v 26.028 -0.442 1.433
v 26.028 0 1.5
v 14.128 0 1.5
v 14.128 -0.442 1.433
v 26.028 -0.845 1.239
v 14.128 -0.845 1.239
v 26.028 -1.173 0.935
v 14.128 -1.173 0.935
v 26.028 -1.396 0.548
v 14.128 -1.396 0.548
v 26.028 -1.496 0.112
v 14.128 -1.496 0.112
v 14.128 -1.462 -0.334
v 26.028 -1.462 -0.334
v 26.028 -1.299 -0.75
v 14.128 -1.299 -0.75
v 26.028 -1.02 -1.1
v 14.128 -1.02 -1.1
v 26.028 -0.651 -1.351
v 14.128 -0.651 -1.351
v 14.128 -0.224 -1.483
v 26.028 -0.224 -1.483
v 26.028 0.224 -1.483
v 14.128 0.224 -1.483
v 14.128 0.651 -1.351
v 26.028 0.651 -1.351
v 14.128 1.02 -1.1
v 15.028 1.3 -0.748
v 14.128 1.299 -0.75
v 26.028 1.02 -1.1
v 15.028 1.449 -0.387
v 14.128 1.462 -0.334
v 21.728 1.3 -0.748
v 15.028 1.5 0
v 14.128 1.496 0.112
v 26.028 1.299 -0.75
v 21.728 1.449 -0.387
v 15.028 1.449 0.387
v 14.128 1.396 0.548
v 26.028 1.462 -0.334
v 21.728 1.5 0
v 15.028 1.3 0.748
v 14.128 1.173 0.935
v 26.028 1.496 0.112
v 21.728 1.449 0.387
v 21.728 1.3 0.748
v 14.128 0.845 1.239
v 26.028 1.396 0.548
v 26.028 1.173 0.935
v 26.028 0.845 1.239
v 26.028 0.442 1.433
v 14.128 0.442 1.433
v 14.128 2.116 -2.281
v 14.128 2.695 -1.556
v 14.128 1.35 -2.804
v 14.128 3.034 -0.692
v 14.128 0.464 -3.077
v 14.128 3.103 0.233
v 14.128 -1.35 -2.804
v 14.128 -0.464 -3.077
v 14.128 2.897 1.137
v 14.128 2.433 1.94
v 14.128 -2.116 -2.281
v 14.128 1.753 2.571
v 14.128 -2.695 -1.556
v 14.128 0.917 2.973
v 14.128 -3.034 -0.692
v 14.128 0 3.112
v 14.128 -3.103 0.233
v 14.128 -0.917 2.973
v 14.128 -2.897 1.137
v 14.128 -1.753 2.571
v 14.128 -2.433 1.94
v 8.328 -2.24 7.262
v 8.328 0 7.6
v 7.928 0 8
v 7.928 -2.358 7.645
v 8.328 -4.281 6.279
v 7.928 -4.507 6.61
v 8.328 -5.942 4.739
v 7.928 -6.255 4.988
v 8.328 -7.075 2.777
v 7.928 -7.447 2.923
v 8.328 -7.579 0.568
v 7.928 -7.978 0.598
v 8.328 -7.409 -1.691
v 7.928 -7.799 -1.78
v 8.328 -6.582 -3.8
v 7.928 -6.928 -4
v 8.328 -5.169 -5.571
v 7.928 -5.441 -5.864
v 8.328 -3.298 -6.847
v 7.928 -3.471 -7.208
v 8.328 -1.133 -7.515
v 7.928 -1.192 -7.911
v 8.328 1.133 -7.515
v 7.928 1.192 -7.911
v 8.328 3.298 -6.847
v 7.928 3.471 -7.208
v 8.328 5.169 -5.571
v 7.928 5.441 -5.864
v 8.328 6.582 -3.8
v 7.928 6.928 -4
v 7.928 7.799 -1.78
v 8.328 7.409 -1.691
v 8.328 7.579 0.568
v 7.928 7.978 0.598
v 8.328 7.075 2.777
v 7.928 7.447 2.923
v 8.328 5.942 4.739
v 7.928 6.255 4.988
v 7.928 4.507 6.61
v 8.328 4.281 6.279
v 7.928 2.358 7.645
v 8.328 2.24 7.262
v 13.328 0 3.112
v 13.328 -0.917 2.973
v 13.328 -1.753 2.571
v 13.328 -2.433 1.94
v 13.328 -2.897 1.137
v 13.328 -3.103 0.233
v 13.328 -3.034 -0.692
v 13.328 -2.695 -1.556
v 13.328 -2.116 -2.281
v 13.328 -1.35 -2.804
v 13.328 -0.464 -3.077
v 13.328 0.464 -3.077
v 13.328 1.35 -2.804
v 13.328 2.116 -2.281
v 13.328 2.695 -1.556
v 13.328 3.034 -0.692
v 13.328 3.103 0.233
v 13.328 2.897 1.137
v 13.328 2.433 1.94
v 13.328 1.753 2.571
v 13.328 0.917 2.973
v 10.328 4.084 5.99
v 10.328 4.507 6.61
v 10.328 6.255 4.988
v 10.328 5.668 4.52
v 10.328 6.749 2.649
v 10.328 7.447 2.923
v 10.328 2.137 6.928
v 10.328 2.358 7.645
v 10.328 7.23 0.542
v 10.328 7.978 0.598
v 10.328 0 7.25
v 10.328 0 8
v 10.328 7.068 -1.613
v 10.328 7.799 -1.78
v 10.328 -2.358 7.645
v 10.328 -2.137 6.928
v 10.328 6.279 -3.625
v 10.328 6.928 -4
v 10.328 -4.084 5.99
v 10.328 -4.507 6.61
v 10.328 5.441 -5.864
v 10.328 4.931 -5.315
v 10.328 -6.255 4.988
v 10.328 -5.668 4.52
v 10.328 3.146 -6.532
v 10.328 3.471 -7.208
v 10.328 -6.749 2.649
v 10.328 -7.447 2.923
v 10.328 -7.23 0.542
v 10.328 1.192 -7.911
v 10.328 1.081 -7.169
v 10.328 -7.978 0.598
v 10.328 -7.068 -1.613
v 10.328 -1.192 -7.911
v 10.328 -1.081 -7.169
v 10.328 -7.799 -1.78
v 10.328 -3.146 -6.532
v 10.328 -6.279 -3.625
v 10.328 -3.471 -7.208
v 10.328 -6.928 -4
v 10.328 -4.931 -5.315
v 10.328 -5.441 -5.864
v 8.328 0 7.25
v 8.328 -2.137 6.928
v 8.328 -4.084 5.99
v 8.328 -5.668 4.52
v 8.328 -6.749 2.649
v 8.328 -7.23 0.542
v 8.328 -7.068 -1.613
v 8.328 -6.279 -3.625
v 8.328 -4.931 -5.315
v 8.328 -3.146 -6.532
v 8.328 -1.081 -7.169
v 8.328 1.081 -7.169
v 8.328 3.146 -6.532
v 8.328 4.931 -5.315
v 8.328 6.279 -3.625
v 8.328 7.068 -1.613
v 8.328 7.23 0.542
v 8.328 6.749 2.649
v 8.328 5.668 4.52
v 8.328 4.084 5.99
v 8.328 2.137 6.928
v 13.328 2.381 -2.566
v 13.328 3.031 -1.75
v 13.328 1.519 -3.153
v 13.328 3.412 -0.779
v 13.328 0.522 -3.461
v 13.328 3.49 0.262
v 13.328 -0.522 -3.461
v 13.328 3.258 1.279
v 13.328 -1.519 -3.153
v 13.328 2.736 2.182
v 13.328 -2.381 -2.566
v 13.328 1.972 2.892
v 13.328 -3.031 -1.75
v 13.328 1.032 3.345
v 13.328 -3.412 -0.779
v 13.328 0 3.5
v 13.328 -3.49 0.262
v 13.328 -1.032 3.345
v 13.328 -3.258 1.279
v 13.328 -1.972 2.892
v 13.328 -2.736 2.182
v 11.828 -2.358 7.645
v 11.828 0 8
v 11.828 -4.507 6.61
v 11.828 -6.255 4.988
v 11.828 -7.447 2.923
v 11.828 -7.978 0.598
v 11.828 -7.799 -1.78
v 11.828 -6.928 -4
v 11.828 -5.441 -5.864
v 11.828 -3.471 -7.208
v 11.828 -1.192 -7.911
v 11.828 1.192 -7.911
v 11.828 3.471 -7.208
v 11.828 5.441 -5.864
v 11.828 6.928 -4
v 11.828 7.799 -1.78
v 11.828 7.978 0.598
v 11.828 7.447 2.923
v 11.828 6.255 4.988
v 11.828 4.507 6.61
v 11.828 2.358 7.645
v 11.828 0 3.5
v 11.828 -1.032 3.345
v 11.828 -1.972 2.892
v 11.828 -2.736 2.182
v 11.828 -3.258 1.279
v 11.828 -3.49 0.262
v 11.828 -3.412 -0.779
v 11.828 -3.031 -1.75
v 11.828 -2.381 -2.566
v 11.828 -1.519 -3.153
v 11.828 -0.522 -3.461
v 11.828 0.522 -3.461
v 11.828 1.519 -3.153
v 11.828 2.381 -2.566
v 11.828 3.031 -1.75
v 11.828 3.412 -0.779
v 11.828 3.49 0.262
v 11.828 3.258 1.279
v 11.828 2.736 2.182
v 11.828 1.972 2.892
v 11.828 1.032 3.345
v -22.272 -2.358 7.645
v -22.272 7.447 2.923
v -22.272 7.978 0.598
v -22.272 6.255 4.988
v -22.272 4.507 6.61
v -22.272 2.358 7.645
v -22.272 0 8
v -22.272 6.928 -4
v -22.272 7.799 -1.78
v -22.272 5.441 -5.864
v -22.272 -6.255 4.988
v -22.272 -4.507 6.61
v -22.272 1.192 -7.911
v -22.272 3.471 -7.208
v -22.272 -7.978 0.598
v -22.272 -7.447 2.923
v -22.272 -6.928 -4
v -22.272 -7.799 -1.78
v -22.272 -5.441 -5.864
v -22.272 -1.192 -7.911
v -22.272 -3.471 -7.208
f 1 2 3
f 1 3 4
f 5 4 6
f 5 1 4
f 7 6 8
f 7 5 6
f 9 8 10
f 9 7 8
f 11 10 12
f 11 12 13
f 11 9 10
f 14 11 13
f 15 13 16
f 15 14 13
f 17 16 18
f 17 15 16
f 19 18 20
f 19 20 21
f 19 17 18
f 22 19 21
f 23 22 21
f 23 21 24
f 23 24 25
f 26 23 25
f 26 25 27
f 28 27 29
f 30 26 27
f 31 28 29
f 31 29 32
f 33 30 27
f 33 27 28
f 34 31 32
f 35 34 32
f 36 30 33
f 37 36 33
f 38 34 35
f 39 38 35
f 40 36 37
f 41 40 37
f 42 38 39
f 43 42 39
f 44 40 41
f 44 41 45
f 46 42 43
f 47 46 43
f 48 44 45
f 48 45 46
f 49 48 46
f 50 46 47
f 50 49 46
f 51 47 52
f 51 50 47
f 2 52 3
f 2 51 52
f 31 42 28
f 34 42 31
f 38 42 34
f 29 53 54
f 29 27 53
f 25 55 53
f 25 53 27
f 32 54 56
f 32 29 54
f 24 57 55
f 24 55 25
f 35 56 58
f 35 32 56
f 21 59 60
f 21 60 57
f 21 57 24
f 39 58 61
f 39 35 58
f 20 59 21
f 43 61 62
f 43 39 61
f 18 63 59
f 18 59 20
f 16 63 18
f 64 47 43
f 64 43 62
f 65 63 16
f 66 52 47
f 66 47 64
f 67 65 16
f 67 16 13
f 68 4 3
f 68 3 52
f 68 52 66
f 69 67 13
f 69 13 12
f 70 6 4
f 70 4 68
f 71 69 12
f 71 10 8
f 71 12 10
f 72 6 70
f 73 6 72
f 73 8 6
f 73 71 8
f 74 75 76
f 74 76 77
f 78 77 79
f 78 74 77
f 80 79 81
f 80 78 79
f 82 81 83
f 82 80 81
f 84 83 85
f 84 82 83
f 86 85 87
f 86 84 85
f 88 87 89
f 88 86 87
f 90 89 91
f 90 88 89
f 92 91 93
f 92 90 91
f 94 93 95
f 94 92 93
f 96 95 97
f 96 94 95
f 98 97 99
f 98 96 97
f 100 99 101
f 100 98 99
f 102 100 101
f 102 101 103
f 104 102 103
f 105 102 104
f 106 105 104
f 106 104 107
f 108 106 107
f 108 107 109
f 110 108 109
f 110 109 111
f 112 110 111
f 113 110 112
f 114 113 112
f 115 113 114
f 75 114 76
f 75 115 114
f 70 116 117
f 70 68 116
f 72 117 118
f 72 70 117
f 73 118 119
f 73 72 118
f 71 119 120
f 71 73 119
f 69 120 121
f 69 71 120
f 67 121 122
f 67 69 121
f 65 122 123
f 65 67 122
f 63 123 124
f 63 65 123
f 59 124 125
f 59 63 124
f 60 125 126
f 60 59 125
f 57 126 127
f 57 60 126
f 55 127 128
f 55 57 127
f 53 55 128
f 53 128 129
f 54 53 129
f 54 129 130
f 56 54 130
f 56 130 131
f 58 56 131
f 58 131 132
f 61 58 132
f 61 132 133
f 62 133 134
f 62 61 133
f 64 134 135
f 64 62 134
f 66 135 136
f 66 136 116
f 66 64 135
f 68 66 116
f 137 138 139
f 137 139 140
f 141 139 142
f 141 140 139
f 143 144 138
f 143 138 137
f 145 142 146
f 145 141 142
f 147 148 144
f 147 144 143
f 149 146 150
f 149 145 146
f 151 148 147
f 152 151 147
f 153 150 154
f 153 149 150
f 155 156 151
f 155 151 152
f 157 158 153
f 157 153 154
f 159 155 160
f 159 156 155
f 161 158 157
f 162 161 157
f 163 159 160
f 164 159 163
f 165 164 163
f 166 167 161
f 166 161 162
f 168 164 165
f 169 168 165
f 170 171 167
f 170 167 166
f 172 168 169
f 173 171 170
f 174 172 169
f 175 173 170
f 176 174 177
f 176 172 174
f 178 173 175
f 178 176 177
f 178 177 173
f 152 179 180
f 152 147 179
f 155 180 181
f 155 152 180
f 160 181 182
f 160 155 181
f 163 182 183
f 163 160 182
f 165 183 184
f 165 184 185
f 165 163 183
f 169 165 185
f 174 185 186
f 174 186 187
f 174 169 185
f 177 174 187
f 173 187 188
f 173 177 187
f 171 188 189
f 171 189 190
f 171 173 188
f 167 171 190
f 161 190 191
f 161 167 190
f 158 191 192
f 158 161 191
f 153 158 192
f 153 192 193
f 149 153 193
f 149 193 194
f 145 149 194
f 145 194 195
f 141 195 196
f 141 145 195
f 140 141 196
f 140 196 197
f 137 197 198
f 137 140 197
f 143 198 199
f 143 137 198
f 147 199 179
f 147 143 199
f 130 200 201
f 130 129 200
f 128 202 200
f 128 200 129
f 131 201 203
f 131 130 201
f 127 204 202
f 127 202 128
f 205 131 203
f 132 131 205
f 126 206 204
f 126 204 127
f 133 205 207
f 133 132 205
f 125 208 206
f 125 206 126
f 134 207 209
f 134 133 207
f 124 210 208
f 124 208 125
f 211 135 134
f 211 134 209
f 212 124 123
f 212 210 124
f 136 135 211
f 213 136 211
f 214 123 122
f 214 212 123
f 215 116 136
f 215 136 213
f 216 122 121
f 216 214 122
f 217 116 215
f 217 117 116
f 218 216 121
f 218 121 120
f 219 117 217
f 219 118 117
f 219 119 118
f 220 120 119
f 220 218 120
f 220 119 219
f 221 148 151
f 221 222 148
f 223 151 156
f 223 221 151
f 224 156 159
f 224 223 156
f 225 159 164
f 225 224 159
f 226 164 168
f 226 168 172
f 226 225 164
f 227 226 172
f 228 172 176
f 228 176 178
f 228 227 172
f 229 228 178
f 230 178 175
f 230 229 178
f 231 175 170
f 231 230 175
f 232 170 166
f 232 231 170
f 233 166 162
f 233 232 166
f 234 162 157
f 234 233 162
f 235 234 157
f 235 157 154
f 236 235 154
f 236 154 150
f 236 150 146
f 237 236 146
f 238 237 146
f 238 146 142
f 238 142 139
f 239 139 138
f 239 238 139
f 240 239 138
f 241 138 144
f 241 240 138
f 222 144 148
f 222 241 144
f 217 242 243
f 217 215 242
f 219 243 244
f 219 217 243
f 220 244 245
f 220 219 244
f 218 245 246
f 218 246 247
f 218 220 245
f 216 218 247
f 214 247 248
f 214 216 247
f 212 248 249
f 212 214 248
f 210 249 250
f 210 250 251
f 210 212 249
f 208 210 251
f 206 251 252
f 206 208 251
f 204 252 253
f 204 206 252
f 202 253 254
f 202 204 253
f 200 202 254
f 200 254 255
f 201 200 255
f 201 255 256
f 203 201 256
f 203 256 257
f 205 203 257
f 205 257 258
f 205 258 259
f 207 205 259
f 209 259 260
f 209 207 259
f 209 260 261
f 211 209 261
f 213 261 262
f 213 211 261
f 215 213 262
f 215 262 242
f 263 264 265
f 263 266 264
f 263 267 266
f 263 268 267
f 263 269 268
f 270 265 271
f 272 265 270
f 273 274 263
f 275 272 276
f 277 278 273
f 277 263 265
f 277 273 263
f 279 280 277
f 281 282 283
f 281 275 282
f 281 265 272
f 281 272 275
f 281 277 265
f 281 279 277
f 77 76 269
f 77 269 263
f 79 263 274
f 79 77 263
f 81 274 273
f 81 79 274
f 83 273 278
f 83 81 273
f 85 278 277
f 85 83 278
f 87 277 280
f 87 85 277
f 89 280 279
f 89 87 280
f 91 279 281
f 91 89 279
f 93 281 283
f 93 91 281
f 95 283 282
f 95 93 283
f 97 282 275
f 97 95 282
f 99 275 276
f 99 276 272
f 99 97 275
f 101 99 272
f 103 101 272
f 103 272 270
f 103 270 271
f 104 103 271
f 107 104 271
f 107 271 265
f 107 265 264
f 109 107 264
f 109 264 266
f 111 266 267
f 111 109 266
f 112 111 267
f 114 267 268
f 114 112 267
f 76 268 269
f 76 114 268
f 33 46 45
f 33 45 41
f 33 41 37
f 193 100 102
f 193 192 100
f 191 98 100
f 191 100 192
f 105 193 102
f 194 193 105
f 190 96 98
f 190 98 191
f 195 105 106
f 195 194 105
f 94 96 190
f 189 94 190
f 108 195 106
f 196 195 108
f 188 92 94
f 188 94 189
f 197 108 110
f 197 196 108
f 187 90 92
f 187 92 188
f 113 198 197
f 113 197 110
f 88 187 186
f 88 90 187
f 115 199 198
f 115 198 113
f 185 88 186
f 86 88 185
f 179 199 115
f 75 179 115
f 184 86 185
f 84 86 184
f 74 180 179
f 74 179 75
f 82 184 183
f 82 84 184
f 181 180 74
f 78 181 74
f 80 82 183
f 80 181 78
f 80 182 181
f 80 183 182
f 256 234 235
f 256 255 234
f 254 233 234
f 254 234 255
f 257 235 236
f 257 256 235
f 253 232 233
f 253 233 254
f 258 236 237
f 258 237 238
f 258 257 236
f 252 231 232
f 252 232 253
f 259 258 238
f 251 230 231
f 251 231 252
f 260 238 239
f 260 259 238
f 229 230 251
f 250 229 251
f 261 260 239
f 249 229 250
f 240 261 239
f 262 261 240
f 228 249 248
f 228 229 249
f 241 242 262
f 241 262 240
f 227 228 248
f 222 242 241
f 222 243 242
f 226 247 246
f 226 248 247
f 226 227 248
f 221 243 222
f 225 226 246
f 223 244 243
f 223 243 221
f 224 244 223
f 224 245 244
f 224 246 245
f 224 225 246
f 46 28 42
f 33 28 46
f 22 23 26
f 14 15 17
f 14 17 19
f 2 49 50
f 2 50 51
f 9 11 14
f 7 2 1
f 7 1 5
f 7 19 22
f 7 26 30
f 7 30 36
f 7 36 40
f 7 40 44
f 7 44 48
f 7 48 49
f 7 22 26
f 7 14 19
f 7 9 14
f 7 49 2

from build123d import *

# Parameters (mm, degrees)
CHANFREIN1_SIZE       = 0.4
EXTRUSION1_DEPTH      = 29.380374565
EXTRUSION1_DEPTH_BACK = 29.380374565
ESQUISSE2_W           = 6.7
ESQUISSE2_H           = 0.2


with BuildPart() as part:
    # Esquisse1 → Révolution1 (revolve)
    with BuildSketch(Plane.XY, mode=Mode.PRIVATE) as r_volution1_sk:
        Polygon((-22.272213686, 0), (-22.272213686, 8), (8.327786314, 8), (8.327786314, 7.25), (10.327786314, 7.25), (10.327786314, 8), (11.827786314, 8), (11.827786314, 3.5), (13.327786314, 3.5), (13.327786314, 3.111665859), (14.127786314, 3.111665859), (14.127786314, 1.5), (26.027786314, 1.5), (26.027786314, 0), align=None)
    revolve(r_volution1_sk.sketch.rotate(Axis((-64.659997946, 0, 0), (1, 0, 0)), 90), axis=Axis((-64.659997946, 0, 0), (1, 0, 0)))

    # Chanfrein1
    chanfrein1_edges = [part.edges().sort_by_distance(p)[0] for p in [
        (8.327786314, 0, -8),
    ]]
    chamfer(chanfrein1_edges, length=CHANFREIN1_SIZE)

    # Esquisse2 → Extrusion1 (cut, two sides: drawn at the far end of the back side and taken through both)
    with BuildSketch(Plane.XY.offset(-EXTRUSION1_DEPTH_BACK)):
        with Locations((18.377786314, 1.4)):
            Rectangle(ESQUISSE2_W, ESQUISSE2_H)
    extrude(amount=EXTRUSION1_DEPTH + EXTRUSION1_DEPTH_BACK, mode=Mode.SUBTRACT)


solid = part.part
